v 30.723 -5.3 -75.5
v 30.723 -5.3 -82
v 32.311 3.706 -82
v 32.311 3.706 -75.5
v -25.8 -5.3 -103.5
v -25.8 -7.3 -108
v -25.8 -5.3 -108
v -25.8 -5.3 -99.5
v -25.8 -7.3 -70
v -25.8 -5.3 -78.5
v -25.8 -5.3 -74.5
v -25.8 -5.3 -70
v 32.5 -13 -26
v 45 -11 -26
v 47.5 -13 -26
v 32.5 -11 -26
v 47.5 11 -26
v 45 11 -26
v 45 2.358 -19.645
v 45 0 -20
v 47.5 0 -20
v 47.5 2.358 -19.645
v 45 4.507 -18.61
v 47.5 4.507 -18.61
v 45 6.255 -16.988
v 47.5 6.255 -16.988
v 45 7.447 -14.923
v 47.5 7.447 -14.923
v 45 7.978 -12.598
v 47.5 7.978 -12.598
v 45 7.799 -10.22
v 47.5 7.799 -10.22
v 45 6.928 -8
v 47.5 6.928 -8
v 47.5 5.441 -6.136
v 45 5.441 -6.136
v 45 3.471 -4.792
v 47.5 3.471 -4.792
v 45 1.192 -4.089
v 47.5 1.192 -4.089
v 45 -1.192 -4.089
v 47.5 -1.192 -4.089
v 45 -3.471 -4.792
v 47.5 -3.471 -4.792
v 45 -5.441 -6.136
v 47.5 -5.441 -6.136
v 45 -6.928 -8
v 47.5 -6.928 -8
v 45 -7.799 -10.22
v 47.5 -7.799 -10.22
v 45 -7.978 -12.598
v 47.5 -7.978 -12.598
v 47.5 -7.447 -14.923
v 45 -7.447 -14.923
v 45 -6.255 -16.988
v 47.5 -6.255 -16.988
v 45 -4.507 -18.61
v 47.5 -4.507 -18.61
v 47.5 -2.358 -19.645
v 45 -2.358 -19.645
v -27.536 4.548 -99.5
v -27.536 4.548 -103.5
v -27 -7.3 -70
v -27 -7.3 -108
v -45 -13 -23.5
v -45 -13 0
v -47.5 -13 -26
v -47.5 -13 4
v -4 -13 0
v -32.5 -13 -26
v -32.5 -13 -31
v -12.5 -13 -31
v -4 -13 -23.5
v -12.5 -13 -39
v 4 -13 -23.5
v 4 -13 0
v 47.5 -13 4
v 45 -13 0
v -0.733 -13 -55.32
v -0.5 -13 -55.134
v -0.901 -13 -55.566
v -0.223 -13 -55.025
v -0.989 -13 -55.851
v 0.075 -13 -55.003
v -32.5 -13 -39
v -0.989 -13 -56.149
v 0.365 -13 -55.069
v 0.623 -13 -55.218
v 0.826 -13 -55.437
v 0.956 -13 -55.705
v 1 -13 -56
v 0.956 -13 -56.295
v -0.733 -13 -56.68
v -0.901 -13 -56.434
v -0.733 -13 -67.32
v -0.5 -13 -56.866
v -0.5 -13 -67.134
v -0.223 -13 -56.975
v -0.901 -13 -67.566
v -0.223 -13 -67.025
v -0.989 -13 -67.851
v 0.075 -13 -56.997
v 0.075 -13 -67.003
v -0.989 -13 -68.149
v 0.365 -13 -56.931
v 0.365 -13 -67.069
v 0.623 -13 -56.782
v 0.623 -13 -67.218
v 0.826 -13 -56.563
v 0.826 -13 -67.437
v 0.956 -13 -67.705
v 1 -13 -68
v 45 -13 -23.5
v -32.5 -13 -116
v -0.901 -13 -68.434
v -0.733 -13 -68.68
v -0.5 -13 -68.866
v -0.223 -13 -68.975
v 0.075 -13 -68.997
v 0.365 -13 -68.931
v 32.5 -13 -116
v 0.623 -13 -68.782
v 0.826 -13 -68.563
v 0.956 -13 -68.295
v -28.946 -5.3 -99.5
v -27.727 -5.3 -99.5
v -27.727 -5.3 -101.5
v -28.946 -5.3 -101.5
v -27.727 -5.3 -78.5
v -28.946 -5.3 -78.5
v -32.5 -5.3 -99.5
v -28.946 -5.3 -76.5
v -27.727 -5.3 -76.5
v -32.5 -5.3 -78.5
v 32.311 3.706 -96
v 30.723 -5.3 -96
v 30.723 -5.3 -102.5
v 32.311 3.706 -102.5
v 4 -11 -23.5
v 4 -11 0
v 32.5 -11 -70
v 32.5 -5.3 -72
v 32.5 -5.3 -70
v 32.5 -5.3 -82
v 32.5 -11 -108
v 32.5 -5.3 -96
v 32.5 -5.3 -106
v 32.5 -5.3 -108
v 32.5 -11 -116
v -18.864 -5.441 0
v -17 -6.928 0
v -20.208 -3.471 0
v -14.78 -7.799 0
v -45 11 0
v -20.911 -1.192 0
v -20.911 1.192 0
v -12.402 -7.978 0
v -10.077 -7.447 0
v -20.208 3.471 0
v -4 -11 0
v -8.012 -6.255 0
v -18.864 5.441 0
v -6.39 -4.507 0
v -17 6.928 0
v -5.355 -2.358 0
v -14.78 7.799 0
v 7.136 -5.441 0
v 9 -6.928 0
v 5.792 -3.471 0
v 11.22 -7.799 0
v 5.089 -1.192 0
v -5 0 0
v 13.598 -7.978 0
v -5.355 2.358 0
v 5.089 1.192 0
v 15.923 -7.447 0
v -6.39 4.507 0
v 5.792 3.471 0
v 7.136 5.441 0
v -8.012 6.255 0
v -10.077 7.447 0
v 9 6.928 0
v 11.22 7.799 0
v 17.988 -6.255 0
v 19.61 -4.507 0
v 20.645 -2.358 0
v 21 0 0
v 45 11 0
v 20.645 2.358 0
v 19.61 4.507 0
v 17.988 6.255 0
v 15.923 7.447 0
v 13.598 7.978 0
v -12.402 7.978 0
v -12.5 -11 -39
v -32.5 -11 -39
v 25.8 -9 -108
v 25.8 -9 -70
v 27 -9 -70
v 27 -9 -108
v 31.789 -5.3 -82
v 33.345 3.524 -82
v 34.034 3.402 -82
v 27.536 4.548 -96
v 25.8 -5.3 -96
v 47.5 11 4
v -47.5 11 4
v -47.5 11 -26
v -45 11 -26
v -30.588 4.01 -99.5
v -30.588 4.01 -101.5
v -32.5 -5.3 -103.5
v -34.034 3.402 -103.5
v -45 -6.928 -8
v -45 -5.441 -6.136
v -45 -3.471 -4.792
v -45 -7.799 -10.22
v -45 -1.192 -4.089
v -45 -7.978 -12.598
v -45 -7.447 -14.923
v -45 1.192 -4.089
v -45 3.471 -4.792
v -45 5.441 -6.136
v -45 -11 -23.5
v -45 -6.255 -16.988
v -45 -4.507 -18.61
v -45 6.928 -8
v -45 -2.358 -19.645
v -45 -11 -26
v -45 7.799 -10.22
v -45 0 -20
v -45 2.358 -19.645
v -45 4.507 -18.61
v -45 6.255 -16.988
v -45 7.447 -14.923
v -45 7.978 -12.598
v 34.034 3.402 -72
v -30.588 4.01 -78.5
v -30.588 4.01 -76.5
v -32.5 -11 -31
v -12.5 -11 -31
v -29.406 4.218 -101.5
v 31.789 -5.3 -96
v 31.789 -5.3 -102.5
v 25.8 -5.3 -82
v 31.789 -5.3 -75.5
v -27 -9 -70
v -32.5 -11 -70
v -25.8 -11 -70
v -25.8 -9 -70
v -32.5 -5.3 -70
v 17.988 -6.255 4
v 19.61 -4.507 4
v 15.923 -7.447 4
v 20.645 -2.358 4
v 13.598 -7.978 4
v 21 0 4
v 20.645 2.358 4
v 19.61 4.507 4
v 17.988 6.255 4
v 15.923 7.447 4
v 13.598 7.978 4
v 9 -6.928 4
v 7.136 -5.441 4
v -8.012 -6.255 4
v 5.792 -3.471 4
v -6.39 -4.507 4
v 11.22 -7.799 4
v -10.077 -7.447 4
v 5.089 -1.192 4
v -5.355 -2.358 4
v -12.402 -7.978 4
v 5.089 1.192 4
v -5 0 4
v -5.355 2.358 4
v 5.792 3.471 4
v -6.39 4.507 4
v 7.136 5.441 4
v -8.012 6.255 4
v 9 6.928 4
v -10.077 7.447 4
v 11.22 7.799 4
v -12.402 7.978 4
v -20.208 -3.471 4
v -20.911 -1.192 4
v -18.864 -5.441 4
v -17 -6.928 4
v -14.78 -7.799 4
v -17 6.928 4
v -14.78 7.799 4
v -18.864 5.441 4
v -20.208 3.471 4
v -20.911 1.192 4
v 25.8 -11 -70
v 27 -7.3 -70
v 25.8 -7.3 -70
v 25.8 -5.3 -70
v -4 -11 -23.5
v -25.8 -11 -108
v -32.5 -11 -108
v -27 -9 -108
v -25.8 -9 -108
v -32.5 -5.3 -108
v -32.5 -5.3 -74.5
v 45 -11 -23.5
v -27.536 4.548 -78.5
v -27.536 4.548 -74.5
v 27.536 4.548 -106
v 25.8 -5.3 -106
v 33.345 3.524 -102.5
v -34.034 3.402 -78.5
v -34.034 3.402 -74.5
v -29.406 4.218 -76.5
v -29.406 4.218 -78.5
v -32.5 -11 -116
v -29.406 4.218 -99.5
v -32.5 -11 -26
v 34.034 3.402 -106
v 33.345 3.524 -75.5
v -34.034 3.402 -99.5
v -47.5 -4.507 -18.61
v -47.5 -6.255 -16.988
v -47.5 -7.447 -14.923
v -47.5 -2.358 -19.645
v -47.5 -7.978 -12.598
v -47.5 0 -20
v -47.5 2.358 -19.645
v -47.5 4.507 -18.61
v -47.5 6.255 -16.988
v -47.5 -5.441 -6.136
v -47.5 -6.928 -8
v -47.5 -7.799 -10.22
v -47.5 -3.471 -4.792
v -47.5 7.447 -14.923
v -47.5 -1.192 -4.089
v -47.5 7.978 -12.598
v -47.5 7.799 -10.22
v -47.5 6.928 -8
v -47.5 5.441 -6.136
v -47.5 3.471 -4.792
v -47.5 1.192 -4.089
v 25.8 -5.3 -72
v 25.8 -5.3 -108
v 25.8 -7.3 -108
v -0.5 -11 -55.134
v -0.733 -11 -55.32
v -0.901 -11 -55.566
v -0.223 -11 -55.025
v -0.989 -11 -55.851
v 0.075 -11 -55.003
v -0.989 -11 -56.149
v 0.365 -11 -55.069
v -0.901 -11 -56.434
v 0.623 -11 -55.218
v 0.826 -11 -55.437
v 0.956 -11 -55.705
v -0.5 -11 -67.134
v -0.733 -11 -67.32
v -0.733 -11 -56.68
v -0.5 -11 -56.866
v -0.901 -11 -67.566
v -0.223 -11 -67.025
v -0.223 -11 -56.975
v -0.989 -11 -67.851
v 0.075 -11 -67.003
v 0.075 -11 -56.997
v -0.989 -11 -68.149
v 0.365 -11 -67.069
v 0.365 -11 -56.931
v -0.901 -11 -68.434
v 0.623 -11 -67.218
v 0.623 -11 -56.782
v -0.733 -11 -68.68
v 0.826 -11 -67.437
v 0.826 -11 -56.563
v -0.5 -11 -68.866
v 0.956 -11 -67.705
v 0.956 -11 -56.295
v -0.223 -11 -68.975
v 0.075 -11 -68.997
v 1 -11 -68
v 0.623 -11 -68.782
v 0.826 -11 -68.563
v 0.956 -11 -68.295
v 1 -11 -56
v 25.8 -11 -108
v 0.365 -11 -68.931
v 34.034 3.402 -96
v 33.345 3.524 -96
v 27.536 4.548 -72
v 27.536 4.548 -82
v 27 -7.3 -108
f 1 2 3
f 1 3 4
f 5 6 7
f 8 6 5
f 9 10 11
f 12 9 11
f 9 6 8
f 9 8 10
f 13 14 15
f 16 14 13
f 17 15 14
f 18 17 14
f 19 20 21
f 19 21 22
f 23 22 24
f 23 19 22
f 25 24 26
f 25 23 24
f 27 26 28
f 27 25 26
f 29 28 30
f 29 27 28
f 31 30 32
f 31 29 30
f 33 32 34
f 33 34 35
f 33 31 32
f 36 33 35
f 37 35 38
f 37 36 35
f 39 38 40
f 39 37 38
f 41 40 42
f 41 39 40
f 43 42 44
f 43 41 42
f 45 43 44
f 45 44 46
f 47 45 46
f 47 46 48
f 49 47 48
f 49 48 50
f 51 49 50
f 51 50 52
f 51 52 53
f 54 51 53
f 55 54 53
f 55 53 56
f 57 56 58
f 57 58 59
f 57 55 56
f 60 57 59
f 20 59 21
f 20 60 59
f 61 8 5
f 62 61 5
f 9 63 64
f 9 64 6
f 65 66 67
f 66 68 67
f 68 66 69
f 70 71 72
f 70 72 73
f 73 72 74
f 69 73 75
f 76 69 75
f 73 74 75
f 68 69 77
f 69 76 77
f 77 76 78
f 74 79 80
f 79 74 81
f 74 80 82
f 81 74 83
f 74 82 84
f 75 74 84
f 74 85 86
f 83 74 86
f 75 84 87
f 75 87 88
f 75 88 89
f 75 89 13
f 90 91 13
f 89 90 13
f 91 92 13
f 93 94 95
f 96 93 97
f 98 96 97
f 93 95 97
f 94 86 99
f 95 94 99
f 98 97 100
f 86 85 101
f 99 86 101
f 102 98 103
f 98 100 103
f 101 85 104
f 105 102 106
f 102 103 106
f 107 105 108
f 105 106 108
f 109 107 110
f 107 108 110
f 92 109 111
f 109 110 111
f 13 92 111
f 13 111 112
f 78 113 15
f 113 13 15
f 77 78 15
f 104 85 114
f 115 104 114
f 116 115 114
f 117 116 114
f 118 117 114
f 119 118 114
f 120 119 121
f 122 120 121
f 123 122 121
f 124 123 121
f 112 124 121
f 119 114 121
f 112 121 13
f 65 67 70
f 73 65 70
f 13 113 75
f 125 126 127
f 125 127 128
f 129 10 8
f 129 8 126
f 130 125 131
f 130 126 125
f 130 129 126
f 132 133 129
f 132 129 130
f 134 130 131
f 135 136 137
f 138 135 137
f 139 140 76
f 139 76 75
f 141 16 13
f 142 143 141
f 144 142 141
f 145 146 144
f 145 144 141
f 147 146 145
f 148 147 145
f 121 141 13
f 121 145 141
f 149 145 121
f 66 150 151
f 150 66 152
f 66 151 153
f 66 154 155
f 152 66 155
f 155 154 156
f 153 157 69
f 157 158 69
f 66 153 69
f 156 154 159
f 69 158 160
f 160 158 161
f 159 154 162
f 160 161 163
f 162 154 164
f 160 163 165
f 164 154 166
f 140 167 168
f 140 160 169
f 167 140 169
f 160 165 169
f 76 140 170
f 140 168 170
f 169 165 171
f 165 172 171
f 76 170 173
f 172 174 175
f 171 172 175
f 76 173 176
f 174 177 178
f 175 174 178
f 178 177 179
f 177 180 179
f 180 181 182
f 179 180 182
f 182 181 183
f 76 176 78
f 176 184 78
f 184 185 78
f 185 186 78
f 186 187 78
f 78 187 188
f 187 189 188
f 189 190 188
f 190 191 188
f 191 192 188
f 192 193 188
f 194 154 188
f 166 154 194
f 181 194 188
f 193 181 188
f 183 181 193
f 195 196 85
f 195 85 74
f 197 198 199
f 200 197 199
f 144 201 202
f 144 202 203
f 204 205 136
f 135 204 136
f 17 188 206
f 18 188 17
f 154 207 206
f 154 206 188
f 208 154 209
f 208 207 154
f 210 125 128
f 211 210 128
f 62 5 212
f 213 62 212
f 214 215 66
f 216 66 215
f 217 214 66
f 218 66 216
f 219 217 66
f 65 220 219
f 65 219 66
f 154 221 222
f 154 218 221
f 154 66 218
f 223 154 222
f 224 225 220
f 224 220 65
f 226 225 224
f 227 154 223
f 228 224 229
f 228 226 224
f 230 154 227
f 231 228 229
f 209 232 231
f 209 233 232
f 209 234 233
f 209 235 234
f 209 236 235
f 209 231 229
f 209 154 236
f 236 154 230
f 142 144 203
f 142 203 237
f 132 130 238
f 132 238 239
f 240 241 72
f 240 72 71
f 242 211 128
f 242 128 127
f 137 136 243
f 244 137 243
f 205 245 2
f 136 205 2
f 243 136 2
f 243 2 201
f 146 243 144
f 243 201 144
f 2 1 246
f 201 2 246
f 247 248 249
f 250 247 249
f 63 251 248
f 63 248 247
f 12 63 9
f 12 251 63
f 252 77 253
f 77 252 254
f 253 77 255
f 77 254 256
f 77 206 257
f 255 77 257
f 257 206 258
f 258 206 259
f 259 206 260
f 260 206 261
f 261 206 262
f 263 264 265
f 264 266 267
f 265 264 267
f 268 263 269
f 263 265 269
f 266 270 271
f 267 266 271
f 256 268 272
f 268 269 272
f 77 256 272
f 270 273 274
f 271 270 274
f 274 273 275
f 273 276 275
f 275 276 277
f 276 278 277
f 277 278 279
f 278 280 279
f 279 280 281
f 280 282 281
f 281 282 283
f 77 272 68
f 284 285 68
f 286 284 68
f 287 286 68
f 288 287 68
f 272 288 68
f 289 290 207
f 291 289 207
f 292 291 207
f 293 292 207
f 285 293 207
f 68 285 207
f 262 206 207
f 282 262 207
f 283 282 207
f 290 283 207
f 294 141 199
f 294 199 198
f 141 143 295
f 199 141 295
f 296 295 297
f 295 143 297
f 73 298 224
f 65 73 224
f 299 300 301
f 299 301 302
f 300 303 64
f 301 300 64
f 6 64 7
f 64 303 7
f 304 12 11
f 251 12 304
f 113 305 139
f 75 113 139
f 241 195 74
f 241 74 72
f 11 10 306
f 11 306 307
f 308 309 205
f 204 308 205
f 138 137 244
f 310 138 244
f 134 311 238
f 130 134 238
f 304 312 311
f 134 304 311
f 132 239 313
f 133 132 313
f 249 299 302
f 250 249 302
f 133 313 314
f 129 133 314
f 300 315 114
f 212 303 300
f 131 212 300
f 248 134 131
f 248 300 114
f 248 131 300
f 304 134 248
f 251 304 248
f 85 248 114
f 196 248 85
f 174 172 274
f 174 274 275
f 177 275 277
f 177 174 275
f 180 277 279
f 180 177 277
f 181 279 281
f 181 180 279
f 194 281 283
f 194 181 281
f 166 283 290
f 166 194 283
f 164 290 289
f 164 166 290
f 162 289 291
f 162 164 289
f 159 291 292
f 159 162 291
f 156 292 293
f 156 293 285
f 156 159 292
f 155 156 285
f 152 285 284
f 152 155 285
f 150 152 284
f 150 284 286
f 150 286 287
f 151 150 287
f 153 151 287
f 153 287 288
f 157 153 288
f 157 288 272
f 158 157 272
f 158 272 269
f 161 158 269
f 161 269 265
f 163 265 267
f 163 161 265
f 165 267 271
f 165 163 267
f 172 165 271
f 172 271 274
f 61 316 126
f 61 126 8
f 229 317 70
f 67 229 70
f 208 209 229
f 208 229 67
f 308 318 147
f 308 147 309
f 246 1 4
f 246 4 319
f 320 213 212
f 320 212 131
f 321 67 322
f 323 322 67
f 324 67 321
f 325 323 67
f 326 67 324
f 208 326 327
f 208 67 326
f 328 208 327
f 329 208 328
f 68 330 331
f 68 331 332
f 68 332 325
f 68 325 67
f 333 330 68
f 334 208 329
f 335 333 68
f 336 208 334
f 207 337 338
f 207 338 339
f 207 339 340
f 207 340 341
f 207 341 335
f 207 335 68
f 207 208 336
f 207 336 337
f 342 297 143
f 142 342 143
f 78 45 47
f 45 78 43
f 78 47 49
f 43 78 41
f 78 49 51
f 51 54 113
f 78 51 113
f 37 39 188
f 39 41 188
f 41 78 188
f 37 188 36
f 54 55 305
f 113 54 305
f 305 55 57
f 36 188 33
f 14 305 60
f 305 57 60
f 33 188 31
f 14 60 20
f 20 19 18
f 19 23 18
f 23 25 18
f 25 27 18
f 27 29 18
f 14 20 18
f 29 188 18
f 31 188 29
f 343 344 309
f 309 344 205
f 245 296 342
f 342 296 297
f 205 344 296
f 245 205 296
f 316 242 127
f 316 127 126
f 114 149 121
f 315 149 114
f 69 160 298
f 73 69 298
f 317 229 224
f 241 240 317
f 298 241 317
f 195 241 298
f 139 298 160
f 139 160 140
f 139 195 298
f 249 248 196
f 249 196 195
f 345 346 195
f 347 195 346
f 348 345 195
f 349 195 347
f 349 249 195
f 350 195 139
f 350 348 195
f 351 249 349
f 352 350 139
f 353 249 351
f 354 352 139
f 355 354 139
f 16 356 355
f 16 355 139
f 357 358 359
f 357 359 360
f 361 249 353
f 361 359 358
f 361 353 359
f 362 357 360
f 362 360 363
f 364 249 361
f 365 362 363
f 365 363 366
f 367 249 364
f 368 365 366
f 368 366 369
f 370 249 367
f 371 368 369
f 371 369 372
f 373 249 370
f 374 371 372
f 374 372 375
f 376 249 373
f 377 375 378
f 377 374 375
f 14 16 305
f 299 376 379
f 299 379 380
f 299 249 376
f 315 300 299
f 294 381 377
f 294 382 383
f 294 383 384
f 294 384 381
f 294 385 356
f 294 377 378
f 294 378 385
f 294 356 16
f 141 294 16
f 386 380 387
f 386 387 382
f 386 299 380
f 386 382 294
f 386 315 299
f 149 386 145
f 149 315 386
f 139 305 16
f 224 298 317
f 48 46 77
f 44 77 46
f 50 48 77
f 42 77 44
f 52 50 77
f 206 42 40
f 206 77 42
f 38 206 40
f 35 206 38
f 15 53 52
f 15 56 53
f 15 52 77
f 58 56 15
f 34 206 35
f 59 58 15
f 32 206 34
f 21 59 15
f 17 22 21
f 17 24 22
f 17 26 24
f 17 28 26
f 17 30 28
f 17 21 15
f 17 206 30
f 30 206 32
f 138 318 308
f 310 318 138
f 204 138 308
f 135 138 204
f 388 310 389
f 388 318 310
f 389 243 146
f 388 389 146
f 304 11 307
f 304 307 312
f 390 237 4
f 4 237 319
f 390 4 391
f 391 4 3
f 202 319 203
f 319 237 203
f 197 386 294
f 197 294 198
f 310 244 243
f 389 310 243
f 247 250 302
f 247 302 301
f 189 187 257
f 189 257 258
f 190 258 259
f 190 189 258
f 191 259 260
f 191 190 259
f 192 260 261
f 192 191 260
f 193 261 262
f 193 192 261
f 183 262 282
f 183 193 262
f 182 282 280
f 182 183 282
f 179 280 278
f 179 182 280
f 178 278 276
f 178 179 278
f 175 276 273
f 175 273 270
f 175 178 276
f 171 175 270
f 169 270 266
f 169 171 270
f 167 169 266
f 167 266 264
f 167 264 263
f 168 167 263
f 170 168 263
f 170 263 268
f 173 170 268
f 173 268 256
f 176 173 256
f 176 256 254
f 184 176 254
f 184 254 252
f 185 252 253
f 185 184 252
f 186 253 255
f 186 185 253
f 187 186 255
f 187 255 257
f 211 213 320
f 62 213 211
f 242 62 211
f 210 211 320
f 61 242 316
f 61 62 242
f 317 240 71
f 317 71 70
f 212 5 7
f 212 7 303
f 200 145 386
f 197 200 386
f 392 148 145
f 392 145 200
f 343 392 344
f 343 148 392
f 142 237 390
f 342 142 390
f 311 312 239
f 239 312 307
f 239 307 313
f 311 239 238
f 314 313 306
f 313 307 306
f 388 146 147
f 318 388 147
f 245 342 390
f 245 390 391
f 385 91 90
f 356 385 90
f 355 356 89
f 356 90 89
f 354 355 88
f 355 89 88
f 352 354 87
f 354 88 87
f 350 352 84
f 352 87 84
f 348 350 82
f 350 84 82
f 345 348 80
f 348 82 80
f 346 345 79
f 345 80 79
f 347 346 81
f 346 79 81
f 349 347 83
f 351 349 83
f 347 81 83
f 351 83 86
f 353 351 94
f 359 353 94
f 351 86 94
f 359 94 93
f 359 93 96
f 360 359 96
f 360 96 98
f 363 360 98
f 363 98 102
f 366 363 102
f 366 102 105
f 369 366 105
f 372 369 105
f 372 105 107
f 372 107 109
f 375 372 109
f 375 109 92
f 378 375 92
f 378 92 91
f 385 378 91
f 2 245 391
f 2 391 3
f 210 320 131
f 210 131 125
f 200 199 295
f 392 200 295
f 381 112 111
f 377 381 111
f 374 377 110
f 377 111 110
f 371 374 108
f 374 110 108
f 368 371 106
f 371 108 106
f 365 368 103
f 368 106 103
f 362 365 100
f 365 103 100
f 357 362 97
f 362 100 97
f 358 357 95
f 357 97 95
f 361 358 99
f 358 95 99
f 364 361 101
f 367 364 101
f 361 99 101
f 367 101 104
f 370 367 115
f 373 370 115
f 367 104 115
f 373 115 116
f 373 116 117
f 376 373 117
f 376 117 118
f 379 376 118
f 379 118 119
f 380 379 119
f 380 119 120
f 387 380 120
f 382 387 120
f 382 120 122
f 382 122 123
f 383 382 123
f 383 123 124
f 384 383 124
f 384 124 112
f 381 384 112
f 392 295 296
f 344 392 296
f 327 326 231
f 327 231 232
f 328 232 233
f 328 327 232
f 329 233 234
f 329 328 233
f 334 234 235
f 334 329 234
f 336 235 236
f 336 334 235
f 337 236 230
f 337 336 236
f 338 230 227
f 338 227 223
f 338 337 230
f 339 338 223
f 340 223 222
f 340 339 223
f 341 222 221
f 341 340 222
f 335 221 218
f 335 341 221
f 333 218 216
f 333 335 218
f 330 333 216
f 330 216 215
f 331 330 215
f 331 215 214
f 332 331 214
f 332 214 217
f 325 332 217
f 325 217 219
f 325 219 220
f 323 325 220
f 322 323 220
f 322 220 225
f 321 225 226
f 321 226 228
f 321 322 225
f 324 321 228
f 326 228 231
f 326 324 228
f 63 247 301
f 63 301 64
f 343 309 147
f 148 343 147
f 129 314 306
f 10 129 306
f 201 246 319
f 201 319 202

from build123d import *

# Parameters (mm, degrees)
SKETCH1_W            = 95
SKETCH1_H            = 22
SKETCH1_R            = 8
BOSS_EXTRUDE1_DEPTH  = 4
SKETCH2_W            = 41
SKETCH2_H            = 23.5
BOSS_EXTRUDE2_DEPTH  = 2
BOSS_EXTRUDE3_START  = -70
BOSS_EXTRUDE3_DEPTH  = 38
BOSS_EXTRUDE5_DEPTH  = 10
BOSS_EXTRUDE6_DEPTH  = 10
SKETCH10_R           = 1
CUT_EXTRUDE1_DEPTH   = 4
BOSS_EXTRUDE11_START = 45
SKETCH11_W           = 30
SKETCH11_H           = 24
SKETCH11_R           = 8
BOSS_EXTRUDE11_DEPTH = 2.5
BOSS_EXTRUDE12_START = -47.5
SKETCH11_2_W         = 30
SKETCH11_2_H         = 24
SKETCH11_2_R         = 8
BOSS_EXTRUDE12_DEPTH = 2.5


with BuildPart() as part:
    # Sketch1 → Boss-Extrude1 (new body)
    with BuildSketch(Plane.XY):
        Rectangle(SKETCH1_W, SKETCH1_H)
        with Locations((-13, 0)):
            Circle(SKETCH1_R, mode=Mode.SUBTRACT)
        with Locations((13, 0)):
            Circle(SKETCH1_R, mode=Mode.SUBTRACT)
    extrude(amount=BOSS_EXTRUDE1_DEPTH)

    # Sketch2 → Boss-Extrude2 (add)
    with BuildSketch(Plane(origin=(0, -11, 0), x_dir=(-1, 0, 0), z_dir=(0, -1, 0))):
        Polygon((-32.5, 116), (32.5, 116), (32.5, 39), (12.5, 39), (12.5, 31), (32.5, 31), (32.5, 26), (47.5, 26), (47.5, -4), (32.5, -4), (-32.5, -4), (-47.5, -4), (-47.5, 26), (-32.5, 26), align=None)
        with Locations((-24.5, 11.75)):
            Rectangle(SKETCH2_W, SKETCH2_H, mode=Mode.SUBTRACT)
        with Locations((24.5, 11.75)):
            Rectangle(SKETCH2_W, SKETCH2_H, mode=Mode.SUBTRACT)
    extrude(amount=BOSS_EXTRUDE2_DEPTH)

    # Sketch4 → Boss-Extrude3 (add)
    with BuildSketch(Plane.XY.offset(BOSS_EXTRUDE3_START)):
        Polygon((-25.8, -11), (-25.8, -9), (-27, -9), (-27, -7.3), (-25.8, -7.3), (-25.8, -5.3), (-32.5, -5.3), (-32.5, -11), align=None)
        Polygon((32.5, -5.3), (32.5, -11), (25.8, -11), (25.8, -9), (27, -9), (27, -7.3), (25.8, -7.3), (25.8, -5.3), align=None)
    extrude(amount=-BOSS_EXTRUDE3_DEPTH)

    # Sketch7 → Boss-Extrude5 (add)
    with BuildSketch(Plane(origin=(0.128388188, -0.728125596, 0), x_dir=(0, 0, 1), z_dir=(-0.17364817766693402, 0.9848077530122075, 0))):
        Polygon((-74.5, -26.328375369), (-74.5, -32.926587315), (-78.5, -32.926587315), (-78.5, -29.426587315), (-76.5, -29.426587315), (-76.5, -28.226587315), (-78.5, -28.226587315), (-78.5, -26.328375369), align=None)
        Polygon((-101.5, -28.226587315), (-99.5, -28.226587315), (-99.5, -26.328375369), (-103.5, -26.328375369), (-103.5, -32.926587315), (-99.5, -32.926587315), (-99.5, -29.426587315), (-101.5, -29.426587315), align=None)
    extrude(amount=BOSS_EXTRUDE5_DEPTH)

    # Sketch8 → Boss-Extrude6 (add)
    with BuildSketch(Plane(origin=(-0.128388188, -0.728125596, 0), x_dir=(0, 0, 1), z_dir=(0.17364817766692736, 0.9848077530122086, 0))):
        Polygon((-82, 26.328375369), (-82, 31.176587315), (-75.5, 31.176587315), (-75.5, 32.226587315), (-82, 32.226587315), (-82, 32.926587315), (-72, 32.926587315), (-72, 26.328375369), align=None)
        Polygon((-96, 32.226587315), (-96, 32.926587315), (-106, 32.926587315), (-106, 26.328375369), (-96, 26.328375369), (-96, 31.176587315), (-102.5, 31.176587315), (-102.5, 32.226587315), align=None)
    extrude(amount=BOSS_EXTRUDE6_DEPTH)

    # Sketch10 → Cut-Extrude1 (cut)
    with BuildSketch(Plane.XZ.offset(13)):
        with Locations((0, -56)):
            Circle(SKETCH10_R)
        with Locations((0, -68)):
            Circle(SKETCH10_R)
    extrude(amount=-CUT_EXTRUDE1_DEPTH, mode=Mode.SUBTRACT)

    # Sketch11 → Boss-Extrude11 (add)
    with BuildSketch(Plane(origin=(0, 0, 0), x_dir=(0, 0, -1), z_dir=(1, 0, 0)).offset(BOSS_EXTRUDE11_START)):
        with Locations((11, -1)):
            Rectangle(SKETCH11_W, SKETCH11_H)
        with Locations((12, 0)):
            Circle(SKETCH11_R, mode=Mode.SUBTRACT)
    extrude(amount=BOSS_EXTRUDE11_DEPTH)

    # Sketch11<2> → Boss-Extrude12 (add)
    with BuildSketch(Plane(origin=(0, 0, 0), x_dir=(0, 0, -1), z_dir=(1, 0, 0)).offset(BOSS_EXTRUDE12_START)):
        with Locations((11, -1)):
            Rectangle(SKETCH11_2_W, SKETCH11_2_H)
        with Locations((12, 0)):
            Circle(SKETCH11_2_R, mode=Mode.SUBTRACT)
    extrude(amount=BOSS_EXTRUDE12_DEPTH)


solid = part.part
